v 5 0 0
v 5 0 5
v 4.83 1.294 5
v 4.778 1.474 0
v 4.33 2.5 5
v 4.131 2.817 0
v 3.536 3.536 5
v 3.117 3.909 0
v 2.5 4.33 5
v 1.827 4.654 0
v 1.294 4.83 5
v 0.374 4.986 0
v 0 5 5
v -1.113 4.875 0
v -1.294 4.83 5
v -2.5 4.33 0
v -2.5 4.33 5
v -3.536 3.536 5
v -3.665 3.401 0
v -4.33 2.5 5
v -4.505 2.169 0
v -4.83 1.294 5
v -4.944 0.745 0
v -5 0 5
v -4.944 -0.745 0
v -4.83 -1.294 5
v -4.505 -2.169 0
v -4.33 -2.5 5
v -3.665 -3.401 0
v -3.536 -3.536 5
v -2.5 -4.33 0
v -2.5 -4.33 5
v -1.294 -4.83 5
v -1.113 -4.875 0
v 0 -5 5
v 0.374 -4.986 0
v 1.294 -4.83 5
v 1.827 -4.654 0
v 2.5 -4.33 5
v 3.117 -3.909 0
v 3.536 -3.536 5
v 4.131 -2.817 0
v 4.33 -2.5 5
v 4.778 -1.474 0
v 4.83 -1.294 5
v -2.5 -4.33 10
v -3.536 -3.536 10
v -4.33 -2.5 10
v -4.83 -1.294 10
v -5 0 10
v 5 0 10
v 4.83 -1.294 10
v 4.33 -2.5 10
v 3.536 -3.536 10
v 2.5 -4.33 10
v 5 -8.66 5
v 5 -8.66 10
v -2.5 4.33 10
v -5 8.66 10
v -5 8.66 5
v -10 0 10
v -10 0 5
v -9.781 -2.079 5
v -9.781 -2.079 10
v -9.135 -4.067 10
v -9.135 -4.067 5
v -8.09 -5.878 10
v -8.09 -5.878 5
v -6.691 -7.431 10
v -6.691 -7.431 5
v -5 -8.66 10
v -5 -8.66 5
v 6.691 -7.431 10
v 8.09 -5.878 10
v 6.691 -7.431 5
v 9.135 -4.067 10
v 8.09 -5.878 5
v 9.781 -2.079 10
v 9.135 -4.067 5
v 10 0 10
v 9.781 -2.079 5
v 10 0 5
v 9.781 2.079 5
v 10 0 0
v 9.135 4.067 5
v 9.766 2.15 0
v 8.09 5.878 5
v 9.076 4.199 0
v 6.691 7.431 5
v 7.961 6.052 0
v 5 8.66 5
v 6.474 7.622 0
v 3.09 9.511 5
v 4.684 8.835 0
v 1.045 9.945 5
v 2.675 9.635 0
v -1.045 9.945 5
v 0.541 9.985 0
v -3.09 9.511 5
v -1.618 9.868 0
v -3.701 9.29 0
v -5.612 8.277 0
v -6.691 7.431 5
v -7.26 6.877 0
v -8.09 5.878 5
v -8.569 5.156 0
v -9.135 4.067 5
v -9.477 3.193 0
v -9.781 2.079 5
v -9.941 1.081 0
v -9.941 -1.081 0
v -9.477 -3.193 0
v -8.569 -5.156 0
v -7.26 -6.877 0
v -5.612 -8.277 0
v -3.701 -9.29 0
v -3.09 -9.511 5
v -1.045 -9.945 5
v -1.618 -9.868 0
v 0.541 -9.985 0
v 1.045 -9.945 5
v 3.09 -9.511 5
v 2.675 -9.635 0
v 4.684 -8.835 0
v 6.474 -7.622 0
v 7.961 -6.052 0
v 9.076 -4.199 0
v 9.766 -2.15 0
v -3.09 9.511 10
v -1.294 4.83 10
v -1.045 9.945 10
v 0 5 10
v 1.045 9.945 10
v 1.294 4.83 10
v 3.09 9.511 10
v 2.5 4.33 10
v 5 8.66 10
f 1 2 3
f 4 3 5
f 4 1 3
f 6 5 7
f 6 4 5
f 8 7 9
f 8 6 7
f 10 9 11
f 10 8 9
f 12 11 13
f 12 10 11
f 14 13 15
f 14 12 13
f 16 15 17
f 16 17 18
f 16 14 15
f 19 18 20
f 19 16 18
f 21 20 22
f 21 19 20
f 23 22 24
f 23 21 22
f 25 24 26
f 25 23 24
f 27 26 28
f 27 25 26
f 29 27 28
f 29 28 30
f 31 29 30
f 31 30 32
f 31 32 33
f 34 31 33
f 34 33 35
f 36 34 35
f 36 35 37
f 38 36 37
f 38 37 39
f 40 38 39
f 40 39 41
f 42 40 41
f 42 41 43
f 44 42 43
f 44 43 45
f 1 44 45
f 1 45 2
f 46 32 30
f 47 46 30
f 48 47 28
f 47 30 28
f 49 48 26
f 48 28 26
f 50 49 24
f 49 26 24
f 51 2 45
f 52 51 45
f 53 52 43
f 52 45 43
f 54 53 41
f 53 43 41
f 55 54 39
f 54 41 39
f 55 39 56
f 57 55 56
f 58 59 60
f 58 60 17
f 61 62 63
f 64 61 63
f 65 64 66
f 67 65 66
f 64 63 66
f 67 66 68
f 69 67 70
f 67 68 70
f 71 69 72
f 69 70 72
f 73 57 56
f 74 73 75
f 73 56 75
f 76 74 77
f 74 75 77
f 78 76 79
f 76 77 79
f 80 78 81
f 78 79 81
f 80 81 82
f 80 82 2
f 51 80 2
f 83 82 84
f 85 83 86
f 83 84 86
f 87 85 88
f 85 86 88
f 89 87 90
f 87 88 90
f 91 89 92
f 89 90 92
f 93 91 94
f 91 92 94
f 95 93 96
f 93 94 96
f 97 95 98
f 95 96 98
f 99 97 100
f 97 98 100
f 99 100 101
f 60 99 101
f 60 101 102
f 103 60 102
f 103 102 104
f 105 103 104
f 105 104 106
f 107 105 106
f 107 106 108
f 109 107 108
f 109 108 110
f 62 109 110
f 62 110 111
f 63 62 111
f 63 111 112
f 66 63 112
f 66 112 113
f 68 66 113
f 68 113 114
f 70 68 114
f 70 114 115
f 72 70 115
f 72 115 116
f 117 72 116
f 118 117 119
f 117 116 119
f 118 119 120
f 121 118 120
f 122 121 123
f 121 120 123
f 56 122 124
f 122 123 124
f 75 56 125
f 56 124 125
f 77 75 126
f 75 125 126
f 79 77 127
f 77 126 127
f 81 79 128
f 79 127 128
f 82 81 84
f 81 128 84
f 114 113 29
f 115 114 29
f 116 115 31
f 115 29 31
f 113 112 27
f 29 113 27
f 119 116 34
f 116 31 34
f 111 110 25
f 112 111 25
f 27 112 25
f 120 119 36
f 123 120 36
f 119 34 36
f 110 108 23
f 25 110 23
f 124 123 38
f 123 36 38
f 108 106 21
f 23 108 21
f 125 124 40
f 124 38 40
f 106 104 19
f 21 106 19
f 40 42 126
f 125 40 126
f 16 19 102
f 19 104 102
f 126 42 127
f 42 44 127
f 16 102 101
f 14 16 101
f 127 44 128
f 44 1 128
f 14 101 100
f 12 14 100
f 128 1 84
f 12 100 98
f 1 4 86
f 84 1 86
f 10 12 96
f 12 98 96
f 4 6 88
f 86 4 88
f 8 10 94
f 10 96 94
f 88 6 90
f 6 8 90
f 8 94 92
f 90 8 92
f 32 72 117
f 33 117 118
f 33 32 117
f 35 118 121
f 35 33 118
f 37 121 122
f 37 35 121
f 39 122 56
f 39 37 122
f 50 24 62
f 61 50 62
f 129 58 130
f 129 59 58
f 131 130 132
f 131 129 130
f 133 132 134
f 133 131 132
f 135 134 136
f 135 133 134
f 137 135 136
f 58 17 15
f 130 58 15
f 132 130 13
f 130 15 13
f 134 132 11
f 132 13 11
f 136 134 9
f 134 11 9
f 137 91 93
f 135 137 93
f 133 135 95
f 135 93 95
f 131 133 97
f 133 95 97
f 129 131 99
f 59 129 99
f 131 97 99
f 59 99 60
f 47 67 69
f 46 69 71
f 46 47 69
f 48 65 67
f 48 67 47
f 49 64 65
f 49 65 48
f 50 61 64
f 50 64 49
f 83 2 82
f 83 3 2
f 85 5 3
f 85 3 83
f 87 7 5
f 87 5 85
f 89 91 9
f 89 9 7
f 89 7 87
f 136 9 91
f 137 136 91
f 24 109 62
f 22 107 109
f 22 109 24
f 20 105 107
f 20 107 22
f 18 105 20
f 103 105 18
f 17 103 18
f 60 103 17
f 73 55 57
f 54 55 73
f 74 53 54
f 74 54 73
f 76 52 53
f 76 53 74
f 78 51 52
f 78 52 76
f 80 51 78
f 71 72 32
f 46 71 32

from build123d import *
from build123d import SkipClean  # not in build123d's __all__

# Parameters (mm, degrees)
F0_R     = 10
F0_R_2   = 5
F1_DEPTH = 5
F3_DEPTH = 5


with BuildPart() as f1:
    # F0 (on Top) → F1 (new body)
    with BuildSketch(Plane.XY):
        Circle(F0_R)
        Circle(F0_R_2, mode=Mode.SUBTRACT)
    extrude(amount=F1_DEPTH)

    # F2 (on face) → F3 (join)
    with BuildSketch(Plane.XY.offset(5)):
        with BuildLine():
            ThreePointArc((-2.5, -4.3301270189), (-4.3301270189, -2.5), (-5, 0))
            Line((-5, 0), (-10, 0))
            ThreePointArc((-10, 0), (-8.6602540378, -5), (-5, -8.6602540378))
            Line((-5, -8.6602540378), (-2.5, -4.3301270189))
        make_face()
        with BuildLine():
            ThreePointArc((5, 0), (4.3301270189, -2.5), (2.5, -4.3301270189))
            Line((2.5, -4.3301270189), (5, -8.6602540378))
            ThreePointArc((5, -8.6602540378), (8.6602540378, -5), (10, 0))
            Line((10, 0), (5, 0))
        make_face()
        with BuildLine():
            ThreePointArc((-2.5, 4.3301270189), (0, 5), (2.5, 4.3301270189))
            Line((2.5, 4.3301270189), (5, 8.6602540378))
            ThreePointArc((5, 8.6602540378), (0, 10), (-5, 8.6602540378))
            Line((-5, 8.6602540378), (-2.5, 4.3301270189))
        make_face()
    with SkipClean():  # cleaning this boolean's faces spoils the solid; the shape is the same uncleaned
        extrude(amount=F3_DEPTH)


solid = f1.part
